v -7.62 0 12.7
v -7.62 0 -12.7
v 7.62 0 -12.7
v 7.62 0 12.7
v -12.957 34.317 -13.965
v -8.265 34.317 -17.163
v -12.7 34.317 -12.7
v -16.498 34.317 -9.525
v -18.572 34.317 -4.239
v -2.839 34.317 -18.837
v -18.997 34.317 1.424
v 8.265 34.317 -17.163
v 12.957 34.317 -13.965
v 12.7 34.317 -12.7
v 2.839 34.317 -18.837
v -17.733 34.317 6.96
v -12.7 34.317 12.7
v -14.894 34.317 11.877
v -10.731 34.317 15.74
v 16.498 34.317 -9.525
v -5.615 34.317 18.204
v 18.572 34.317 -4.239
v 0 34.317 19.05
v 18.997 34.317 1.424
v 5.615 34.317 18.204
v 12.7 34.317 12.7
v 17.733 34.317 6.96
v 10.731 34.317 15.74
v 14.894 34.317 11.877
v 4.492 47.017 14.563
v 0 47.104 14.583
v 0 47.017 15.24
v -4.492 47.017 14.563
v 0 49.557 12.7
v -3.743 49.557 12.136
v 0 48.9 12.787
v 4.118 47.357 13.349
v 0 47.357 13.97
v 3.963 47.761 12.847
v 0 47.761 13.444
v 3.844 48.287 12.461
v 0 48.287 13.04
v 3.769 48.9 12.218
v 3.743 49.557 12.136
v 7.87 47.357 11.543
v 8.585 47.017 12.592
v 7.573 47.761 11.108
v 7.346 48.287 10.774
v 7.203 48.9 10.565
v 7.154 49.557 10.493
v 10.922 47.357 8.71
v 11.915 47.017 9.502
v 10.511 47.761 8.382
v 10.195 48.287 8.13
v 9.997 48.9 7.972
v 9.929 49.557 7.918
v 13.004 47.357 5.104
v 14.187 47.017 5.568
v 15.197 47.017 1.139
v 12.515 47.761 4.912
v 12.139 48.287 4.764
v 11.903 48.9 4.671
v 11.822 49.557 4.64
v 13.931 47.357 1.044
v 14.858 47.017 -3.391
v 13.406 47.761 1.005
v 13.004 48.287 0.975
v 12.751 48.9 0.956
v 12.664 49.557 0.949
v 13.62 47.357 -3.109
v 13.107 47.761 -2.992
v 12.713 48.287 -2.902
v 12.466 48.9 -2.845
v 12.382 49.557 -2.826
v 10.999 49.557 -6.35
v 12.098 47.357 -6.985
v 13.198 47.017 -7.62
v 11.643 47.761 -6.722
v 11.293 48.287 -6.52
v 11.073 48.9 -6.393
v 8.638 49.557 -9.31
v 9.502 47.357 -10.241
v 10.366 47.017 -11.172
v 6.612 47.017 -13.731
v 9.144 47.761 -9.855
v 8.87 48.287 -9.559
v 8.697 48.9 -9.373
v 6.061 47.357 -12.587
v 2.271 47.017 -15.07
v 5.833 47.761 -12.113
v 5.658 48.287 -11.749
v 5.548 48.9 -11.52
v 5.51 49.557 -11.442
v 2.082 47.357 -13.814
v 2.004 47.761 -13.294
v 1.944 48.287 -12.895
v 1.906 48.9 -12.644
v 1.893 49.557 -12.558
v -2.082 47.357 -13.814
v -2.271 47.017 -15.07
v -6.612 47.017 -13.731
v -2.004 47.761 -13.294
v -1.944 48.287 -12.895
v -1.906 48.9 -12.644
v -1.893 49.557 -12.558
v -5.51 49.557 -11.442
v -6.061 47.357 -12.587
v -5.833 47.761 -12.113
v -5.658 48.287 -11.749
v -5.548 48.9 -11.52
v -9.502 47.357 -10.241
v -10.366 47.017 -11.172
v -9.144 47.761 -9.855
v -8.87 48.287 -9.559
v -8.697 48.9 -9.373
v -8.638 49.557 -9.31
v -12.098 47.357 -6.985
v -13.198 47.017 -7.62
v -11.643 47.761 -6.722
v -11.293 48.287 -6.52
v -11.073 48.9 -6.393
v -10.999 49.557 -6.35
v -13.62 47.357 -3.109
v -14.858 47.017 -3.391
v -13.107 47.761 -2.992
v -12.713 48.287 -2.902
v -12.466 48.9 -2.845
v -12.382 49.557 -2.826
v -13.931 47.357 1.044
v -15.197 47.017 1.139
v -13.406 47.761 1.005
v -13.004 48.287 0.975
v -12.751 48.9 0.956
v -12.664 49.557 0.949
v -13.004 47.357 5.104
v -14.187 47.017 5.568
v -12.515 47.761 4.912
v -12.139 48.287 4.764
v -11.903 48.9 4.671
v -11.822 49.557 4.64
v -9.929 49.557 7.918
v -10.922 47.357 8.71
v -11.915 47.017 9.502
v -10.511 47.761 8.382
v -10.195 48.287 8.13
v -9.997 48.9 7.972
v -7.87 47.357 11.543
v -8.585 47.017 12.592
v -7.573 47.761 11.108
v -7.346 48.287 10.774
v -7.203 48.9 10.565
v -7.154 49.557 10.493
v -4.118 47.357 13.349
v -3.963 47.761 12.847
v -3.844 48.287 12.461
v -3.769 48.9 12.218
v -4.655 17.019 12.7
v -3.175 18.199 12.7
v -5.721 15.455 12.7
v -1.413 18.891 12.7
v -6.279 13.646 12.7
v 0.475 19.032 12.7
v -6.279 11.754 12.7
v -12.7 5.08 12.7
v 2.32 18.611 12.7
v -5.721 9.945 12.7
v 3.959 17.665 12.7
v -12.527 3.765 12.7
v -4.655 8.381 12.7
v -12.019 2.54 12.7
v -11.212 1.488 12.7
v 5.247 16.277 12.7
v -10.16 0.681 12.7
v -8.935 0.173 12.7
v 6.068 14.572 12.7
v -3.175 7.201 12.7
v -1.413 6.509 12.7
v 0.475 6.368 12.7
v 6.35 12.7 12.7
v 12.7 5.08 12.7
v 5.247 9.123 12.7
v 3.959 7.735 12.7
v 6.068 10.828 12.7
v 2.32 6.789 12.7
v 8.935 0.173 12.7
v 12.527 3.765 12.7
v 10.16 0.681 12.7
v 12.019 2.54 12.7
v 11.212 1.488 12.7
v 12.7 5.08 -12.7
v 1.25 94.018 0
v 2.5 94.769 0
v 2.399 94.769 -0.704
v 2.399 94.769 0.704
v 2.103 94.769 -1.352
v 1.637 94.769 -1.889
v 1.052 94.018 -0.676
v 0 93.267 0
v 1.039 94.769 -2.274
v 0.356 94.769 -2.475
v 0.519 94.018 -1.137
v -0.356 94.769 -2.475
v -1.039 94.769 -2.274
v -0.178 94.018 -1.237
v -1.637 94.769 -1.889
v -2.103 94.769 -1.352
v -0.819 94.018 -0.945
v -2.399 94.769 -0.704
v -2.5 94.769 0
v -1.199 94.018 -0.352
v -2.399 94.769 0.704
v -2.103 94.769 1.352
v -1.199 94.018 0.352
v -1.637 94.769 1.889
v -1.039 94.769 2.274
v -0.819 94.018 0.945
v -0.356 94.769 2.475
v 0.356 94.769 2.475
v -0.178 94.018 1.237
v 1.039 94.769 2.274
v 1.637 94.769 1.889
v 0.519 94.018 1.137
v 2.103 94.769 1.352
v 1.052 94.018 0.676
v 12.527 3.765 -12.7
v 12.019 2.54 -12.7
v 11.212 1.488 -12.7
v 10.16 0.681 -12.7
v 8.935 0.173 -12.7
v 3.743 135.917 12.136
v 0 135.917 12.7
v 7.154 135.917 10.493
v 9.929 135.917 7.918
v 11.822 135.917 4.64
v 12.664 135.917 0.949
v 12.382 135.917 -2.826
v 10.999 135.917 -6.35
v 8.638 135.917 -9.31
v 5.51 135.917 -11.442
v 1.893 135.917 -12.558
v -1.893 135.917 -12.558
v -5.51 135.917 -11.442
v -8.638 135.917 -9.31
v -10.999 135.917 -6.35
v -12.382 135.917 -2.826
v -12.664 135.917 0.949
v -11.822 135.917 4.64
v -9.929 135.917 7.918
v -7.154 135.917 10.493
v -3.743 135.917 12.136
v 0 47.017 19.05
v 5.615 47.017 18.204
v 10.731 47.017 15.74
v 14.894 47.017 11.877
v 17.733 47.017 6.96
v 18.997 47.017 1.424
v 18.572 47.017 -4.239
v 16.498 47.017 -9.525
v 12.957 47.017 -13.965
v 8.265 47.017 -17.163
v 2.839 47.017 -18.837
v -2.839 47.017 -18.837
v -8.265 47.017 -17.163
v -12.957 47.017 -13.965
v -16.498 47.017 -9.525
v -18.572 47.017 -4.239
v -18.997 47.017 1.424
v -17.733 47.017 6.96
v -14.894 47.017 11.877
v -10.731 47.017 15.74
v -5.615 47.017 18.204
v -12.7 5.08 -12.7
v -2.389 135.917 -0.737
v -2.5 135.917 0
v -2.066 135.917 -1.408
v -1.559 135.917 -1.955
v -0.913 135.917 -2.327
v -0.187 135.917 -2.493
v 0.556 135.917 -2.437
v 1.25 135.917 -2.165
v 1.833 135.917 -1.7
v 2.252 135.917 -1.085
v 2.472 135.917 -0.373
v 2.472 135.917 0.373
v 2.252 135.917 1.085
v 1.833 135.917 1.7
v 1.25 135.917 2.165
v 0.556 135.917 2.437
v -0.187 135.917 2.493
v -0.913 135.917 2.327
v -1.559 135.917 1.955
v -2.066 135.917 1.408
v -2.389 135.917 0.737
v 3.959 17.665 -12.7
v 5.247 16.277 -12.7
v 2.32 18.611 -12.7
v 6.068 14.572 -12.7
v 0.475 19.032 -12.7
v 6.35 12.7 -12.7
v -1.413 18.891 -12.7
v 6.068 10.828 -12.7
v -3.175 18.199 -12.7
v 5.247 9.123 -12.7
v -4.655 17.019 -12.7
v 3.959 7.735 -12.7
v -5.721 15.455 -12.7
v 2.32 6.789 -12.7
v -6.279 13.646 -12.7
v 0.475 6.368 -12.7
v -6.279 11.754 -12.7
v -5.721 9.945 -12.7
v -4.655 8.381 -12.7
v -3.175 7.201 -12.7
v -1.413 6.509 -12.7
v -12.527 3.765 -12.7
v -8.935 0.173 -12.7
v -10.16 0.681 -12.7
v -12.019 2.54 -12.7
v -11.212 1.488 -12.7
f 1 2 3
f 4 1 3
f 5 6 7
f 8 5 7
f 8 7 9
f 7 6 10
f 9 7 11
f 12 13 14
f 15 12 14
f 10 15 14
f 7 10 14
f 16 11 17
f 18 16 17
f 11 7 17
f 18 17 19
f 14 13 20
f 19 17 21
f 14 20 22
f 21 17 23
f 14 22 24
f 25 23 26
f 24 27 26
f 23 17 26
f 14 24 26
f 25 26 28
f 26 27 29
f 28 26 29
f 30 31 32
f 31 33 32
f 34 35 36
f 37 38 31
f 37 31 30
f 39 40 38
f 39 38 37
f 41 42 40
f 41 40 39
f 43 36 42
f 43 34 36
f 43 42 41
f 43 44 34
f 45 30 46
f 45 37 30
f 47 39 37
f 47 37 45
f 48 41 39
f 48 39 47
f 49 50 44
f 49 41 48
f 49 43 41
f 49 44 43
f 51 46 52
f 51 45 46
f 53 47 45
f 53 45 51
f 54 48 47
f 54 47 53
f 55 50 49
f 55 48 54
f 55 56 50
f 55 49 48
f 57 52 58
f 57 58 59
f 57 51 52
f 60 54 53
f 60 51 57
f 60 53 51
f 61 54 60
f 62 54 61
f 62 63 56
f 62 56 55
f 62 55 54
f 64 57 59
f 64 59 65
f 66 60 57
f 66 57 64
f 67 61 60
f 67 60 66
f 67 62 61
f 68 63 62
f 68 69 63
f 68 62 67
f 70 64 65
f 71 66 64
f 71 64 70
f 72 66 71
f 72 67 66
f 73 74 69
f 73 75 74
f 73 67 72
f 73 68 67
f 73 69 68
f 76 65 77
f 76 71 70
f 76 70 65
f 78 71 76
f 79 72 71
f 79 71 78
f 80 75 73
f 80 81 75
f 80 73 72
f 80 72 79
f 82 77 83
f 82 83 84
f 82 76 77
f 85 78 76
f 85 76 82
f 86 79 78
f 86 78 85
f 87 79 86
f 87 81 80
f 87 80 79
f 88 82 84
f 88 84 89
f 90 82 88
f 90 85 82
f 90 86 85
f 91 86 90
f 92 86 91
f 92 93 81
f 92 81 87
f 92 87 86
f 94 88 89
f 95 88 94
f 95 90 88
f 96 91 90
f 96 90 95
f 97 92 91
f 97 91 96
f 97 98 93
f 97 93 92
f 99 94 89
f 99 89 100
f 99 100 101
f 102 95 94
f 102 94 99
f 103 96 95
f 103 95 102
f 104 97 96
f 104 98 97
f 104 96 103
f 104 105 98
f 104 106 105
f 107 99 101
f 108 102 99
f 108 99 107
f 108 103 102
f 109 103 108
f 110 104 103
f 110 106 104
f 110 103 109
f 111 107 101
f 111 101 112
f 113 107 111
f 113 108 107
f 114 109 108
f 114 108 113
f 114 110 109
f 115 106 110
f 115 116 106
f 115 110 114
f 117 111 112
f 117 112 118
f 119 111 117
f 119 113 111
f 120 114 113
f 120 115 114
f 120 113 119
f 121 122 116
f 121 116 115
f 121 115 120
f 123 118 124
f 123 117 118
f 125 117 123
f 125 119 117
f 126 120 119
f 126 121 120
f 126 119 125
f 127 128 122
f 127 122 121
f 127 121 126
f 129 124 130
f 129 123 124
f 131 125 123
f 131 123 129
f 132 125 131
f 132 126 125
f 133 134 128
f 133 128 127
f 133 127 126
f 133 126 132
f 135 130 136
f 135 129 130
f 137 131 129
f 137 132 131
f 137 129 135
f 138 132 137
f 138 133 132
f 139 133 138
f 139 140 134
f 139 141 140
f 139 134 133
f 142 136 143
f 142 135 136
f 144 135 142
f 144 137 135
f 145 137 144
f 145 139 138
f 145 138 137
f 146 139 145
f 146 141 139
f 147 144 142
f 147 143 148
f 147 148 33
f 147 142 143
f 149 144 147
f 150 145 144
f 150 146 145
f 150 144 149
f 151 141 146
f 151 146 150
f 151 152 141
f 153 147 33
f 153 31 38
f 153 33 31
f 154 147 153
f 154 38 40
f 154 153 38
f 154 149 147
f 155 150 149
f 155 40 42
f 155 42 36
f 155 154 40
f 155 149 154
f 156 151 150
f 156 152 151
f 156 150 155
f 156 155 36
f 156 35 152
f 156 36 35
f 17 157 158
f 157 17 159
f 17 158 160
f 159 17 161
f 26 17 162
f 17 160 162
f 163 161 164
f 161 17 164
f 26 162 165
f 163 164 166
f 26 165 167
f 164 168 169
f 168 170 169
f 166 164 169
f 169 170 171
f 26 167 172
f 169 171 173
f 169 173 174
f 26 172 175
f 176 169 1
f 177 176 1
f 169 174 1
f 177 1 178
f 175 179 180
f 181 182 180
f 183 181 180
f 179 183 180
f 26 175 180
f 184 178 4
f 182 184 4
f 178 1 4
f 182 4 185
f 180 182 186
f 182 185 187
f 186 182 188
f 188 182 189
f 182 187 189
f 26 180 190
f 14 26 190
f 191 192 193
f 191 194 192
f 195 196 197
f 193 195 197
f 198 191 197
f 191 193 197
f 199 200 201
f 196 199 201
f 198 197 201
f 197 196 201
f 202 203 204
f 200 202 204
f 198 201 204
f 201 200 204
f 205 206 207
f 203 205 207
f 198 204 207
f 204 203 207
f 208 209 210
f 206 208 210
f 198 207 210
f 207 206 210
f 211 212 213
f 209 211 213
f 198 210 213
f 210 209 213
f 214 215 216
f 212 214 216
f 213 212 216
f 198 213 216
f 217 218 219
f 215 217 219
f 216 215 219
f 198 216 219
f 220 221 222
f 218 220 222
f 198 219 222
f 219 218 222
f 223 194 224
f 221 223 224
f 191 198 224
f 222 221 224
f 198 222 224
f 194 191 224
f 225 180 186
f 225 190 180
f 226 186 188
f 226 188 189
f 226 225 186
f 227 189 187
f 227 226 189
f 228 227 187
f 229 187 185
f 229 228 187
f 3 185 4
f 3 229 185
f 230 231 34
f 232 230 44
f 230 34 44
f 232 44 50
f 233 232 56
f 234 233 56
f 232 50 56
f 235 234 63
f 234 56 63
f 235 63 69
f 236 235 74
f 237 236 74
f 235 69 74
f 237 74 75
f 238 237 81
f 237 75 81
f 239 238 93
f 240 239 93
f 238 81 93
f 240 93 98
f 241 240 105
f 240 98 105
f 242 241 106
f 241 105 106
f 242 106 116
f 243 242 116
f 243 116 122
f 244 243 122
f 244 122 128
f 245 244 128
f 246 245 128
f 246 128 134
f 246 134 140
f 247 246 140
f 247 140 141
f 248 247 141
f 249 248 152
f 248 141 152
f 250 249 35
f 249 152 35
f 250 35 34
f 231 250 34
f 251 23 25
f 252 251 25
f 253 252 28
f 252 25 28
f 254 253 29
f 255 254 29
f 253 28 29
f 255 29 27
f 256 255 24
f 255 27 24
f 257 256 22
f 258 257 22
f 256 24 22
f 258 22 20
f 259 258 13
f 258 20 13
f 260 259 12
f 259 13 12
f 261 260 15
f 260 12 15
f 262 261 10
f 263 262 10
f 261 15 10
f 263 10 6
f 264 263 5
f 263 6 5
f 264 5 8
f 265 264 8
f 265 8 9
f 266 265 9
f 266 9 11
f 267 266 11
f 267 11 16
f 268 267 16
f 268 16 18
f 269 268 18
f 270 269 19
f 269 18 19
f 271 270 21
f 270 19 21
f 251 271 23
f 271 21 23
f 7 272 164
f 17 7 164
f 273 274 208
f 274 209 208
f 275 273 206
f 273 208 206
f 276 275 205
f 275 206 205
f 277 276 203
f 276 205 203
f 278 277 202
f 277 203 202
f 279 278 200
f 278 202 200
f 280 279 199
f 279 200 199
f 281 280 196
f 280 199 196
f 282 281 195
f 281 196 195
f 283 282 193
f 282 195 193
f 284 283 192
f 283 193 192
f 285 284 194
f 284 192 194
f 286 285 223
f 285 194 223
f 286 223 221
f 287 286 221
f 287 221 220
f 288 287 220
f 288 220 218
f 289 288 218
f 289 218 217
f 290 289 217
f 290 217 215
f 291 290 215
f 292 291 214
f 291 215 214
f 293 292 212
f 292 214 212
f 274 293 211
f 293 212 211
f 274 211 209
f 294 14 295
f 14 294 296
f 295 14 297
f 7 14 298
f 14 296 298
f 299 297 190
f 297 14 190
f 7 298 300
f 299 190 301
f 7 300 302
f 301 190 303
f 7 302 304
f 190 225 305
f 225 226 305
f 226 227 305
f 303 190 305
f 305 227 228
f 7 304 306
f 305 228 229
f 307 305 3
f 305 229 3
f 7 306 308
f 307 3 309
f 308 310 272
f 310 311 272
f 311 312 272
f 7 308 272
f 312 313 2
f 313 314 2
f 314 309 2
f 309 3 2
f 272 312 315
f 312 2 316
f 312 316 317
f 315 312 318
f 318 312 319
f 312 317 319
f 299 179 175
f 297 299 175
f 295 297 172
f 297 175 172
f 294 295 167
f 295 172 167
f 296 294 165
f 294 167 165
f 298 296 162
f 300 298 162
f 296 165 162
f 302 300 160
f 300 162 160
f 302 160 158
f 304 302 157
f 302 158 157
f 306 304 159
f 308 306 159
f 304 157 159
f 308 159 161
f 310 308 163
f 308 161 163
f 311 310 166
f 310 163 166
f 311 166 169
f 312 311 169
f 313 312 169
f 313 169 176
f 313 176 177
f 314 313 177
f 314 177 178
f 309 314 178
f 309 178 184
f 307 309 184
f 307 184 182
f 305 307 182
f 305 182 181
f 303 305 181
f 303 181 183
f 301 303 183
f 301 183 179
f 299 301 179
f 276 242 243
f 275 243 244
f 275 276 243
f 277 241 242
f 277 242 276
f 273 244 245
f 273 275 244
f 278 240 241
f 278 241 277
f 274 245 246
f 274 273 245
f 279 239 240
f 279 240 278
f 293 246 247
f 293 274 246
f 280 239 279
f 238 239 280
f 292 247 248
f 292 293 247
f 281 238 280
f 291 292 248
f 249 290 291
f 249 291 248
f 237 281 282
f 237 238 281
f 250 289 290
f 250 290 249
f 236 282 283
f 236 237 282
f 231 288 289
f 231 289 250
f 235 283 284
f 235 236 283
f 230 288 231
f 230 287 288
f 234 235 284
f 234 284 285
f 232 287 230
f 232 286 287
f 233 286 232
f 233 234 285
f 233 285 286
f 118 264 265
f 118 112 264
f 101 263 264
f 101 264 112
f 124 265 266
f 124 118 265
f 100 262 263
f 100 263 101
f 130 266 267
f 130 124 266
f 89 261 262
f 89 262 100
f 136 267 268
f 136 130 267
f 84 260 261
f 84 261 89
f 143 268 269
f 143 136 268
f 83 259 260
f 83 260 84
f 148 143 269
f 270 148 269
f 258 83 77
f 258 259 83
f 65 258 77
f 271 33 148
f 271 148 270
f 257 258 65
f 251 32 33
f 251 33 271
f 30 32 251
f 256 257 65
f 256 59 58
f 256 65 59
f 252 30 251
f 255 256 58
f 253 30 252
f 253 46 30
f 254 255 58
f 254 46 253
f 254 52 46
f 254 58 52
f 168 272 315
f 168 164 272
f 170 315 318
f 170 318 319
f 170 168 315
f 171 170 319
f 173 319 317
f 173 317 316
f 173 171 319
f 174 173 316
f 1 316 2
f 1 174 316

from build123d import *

# Parameters (mm, degrees)
BOSS_EXTRUDE1_DEPTH       = 34.31697226
SKETCH4_R                 = 19.05
BOSS_EXTRUDE2_DEPTH       = 12.7
SKETCH6_R                 = 12.7
BOSS_EXTRUDE3_DEPTH       = 88.9
SKETCH7_R                 = 6.35
CUT_EXTRUDE1_DEPTH        = 141.870111622
FILLET1_R                 = 5.08
FILLET2_R                 = 2.54
M6X1_0_TAPPED_HOLE1_D     = 5
M6X1_0_TAPPED_HOLE1_DEPTH = 41.148
M6X1_0_TAPPED_HOLE1_TIP   = 1.502151548


with BuildPart() as part:
    # Sketch3 → Boss-Extrude1 (new body)
    with BuildSketch(Plane(origin=(0, 0, 0), x_dir=(1, 0, 0), z_dir=(0, 1, 0))):
        Polygon((12.7, 0), (12.7, 12.7), (0, 12.7), (-12.7, 12.7), (-12.7, 0), (-12.7, -12.7), (0, -12.7), (12.7, -12.7), align=None)
    extrude(amount=BOSS_EXTRUDE1_DEPTH)

    # Sketch4 → Boss-Extrude2 (add)
    with BuildSketch(Plane(origin=(0, 34.31697226, 0), x_dir=(1, 0, 0), z_dir=(0, 1, 0))):
        with Locations(Location((0, 0, 0), (0, 0, 270))):
            Circle(SKETCH4_R)
    extrude(amount=BOSS_EXTRUDE2_DEPTH)

    # Sketch6 → Boss-Extrude3 (add)
    with BuildSketch(Plane(origin=(0, 47.01697226, 0), x_dir=(1, 0, 0), z_dir=(0, 1, 0))):
        with Locations(Location((0, 0, 0), (0, 0, 270))):
            Circle(SKETCH6_R)
    extrude(amount=BOSS_EXTRUDE3_DEPTH)

    # Sketch7 → Cut-Extrude1 (cut, through all)
    with BuildSketch(Plane.XY.offset(12.7)):
        with Locations((0, 12.7)):
            Circle(SKETCH7_R)
    extrude(amount=-CUT_EXTRUDE1_DEPTH, mode=Mode.SUBTRACT)

    # Fillet1
    fillet1_edges = [part.edges().sort_by_distance(p)[0] for p in [
        (12.7, 0, 0),
        (-12.7, 0, 0),
    ]]
    fillet(fillet1_edges, radius=FILLET1_R)

    # Fillet2
    fillet2_edges = [part.edges().sort_by_distance(p)[0] for p in [
        (0, 47.01697226, -12.7),
    ]]
    fillet(fillet2_edges, radius=FILLET2_R)

    # M6x1.0 Tapped Hole1
    with Locations(Plane(origin=(0, 135.91697226, 0), x_dir=(1, 0, 0), z_dir=(0, 1, 0))):
        with Locations((0, 0)):
            Hole(M6X1_0_TAPPED_HOLE1_D / 2, depth=M6X1_0_TAPPED_HOLE1_DEPTH)
            with Locations((0, 0, -(M6X1_0_TAPPED_HOLE1_DEPTH + M6X1_0_TAPPED_HOLE1_TIP / 2))):  # 118° drill point
                Cone(0, M6X1_0_TAPPED_HOLE1_D / 2, M6X1_0_TAPPED_HOLE1_TIP, mode=Mode.SUBTRACT)


solid = part.part
